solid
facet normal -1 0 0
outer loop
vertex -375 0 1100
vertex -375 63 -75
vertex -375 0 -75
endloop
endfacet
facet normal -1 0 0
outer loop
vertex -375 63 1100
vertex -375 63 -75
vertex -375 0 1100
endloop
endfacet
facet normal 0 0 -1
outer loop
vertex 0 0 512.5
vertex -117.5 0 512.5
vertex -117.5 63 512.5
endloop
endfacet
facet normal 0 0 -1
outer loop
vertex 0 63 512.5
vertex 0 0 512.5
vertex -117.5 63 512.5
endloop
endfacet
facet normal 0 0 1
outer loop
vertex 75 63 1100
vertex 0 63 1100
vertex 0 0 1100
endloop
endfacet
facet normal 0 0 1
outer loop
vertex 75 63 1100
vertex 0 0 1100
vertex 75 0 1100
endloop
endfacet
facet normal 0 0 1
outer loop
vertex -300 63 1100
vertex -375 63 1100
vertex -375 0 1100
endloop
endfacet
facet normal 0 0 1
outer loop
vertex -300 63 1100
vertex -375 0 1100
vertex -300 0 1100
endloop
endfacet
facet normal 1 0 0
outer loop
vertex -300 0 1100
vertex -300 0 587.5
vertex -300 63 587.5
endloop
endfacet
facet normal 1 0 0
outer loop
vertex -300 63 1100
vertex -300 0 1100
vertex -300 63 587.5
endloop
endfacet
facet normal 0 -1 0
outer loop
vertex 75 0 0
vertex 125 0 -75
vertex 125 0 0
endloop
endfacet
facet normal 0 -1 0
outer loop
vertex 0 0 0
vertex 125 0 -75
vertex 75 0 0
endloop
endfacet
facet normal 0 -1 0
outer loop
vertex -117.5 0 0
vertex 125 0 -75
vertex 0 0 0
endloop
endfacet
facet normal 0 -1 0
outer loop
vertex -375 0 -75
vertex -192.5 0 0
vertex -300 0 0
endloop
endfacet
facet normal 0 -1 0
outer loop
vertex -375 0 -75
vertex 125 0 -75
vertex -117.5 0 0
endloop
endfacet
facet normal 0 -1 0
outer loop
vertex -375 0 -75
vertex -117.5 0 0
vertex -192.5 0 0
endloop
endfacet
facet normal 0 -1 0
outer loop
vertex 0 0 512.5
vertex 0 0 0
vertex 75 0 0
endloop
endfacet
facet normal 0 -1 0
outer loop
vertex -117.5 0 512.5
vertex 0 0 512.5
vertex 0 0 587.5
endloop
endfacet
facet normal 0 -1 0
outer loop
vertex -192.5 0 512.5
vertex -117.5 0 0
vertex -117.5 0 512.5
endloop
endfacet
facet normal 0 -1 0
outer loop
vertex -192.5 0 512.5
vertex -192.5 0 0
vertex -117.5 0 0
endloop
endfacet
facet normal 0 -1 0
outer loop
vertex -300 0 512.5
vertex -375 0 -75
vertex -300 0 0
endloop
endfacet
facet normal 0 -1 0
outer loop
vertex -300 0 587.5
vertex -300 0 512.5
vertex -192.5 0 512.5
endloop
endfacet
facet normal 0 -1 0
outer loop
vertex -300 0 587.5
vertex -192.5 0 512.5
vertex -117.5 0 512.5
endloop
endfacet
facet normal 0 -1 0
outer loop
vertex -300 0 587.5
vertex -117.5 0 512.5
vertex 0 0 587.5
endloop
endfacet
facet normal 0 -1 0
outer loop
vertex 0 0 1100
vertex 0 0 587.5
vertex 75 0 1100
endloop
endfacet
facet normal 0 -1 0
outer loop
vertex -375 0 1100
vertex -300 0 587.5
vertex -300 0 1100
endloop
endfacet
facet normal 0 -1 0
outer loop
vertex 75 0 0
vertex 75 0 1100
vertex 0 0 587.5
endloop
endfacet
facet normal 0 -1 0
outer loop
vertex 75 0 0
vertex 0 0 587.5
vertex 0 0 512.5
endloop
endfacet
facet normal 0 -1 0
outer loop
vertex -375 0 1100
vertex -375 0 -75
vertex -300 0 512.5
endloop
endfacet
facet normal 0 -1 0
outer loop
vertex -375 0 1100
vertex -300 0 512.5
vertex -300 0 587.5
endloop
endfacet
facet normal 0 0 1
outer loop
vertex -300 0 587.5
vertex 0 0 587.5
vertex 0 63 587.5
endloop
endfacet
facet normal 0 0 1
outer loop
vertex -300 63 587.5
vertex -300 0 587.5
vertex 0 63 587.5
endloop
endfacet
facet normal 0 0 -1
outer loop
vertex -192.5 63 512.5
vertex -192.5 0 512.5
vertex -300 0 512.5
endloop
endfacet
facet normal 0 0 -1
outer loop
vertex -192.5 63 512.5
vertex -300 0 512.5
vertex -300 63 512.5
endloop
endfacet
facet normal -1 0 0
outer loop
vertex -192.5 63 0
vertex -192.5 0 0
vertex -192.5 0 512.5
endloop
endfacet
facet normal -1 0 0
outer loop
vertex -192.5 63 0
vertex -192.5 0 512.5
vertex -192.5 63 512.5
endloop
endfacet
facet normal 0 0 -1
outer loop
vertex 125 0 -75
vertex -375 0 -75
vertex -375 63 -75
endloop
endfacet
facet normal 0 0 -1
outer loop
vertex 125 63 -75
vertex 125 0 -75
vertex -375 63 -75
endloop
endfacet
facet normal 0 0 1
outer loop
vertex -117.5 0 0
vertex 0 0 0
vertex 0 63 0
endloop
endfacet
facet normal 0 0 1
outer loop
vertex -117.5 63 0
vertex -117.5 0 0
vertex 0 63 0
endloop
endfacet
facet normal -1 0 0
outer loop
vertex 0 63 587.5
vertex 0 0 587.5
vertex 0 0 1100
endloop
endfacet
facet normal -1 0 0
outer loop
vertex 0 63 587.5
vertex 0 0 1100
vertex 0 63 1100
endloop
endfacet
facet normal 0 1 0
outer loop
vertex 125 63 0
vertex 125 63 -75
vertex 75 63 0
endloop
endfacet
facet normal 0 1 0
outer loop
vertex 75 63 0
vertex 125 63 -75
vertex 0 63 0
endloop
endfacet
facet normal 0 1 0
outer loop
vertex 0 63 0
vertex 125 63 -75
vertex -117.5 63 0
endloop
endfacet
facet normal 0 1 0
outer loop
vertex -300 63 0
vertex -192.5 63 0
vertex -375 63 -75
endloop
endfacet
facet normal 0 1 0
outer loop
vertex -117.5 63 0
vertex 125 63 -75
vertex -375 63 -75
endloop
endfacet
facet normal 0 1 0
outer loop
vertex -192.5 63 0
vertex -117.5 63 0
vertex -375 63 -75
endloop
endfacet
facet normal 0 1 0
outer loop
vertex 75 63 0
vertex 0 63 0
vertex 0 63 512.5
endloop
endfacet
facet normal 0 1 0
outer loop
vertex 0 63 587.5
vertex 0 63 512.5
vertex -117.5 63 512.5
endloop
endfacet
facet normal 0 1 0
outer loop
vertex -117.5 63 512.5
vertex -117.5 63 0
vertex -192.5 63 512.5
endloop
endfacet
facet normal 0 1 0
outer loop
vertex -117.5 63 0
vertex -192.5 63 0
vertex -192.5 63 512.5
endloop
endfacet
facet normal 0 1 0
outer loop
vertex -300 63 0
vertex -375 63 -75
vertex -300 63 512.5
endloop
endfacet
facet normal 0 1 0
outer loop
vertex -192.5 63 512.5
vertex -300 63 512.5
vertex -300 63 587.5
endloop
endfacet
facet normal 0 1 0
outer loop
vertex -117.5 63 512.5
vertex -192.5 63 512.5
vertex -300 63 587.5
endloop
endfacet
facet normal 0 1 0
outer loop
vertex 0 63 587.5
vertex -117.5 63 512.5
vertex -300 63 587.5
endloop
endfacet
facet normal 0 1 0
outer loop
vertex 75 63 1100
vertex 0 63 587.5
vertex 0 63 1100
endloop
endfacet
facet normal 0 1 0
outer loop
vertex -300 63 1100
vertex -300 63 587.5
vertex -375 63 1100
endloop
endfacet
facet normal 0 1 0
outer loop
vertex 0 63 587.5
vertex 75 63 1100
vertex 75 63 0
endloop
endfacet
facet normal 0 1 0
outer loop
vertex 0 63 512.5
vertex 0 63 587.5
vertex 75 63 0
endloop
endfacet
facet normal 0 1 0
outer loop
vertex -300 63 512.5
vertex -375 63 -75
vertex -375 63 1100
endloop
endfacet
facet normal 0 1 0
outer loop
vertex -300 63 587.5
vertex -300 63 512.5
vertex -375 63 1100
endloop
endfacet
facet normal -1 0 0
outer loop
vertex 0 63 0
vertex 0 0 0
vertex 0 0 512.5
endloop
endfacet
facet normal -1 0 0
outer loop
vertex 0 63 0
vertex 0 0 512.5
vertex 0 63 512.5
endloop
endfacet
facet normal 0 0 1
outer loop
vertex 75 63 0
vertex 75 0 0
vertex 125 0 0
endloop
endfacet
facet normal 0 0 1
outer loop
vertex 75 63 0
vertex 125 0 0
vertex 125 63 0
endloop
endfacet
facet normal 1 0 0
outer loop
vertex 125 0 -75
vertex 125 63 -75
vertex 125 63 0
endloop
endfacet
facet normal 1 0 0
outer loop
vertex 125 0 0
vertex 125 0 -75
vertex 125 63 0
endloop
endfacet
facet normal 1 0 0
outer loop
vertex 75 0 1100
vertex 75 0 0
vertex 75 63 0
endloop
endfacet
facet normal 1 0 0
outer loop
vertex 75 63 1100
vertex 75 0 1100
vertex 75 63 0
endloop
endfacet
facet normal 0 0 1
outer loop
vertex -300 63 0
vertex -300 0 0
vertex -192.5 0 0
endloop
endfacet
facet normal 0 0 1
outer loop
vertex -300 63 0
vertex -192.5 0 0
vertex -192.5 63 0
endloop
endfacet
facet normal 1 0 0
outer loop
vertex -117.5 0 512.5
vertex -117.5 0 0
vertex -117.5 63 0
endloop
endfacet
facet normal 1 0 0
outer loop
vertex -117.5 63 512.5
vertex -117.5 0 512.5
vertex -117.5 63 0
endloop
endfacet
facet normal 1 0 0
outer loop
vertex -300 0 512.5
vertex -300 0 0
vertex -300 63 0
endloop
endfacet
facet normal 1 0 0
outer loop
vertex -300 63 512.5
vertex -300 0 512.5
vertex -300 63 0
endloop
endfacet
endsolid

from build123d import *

# Parameters (mm, degrees)
ESQUISSE1_W                = 75
ESQUISSE1_H                = 63
BOSS_EXTRU_1_DEPTH         = 1100
R_P_TITION_LIN_AIRE2_COUNT = 2
R_P_TITION_LIN_AIRE2_PITCH = 375
ESQUISSE3_W                = 75
ESQUISSE3_H                = 63
BOSS_EXTRU_2_DEPTH         = 512.5
BOSS_EXTRU_3_DEPTH         = 182.5
BOSS_EXTRU_3_DEPTH_BACK    = 192.5
ESQUISSE4_W                = 75
ESQUISSE4_H                = 63
ESQUISSE5_W                = 75
ESQUISSE5_H                = 63
BOSS_EXTRU_4_DEPTH         = 500


with BuildPart() as part:
    # Esquisse1 → Boss.-Extru.1 (new body)
    with BuildSketch(Plane.XY):
        with Locations((37.5, 31.5)):
            Rectangle(ESQUISSE1_W, ESQUISSE1_H)
    extrude(amount=BOSS_EXTRU_1_DEPTH)


with BuildPart() as r_p_tition_lin_aire2_1:
    # Répétition linéaire2: pattern copy
    add(part.part.moved(Location(Vector(-1, 0, 0) * (1 * R_P_TITION_LIN_AIRE2_PITCH))))


with BuildPart() as body_3:
    # Esquisse3 → Boss.-Extru.2 (new body)
    with BuildSketch(Plane.XY):
        with Locations((-155, 31.5)):
            Rectangle(ESQUISSE3_W, ESQUISSE3_H)
    extrude(amount=BOSS_EXTRU_2_DEPTH)


with BuildPart() as part_1:
    add(part.part)

    add(r_p_tition_lin_aire2_1.part)  # Boss.-Extru.3 merges Répétition linéaire2_1

    add(body_3.part)  # Boss.-Extru.3 merges body 3
    # Esquisse4 → Boss.-Extru.3 (add, two sides: drawn at the far end of the back side and taken through both)
    with BuildSketch(Plane.ZY.offset(192.5).offset(-BOSS_EXTRU_3_DEPTH_BACK)):
        with Locations((550, 31.5)):
            Rectangle(ESQUISSE4_W, ESQUISSE4_H)
    extrude(amount=BOSS_EXTRU_3_DEPTH + BOSS_EXTRU_3_DEPTH_BACK)

    # Esquisse5 → Boss.-Extru.4 (add)
    with BuildSketch(Plane.ZY.offset(375)):
        with Locations((-37.5, 31.5)):
            Rectangle(ESQUISSE5_W, ESQUISSE5_H)
    extrude(amount=-BOSS_EXTRU_4_DEPTH)


solid = part_1.part
